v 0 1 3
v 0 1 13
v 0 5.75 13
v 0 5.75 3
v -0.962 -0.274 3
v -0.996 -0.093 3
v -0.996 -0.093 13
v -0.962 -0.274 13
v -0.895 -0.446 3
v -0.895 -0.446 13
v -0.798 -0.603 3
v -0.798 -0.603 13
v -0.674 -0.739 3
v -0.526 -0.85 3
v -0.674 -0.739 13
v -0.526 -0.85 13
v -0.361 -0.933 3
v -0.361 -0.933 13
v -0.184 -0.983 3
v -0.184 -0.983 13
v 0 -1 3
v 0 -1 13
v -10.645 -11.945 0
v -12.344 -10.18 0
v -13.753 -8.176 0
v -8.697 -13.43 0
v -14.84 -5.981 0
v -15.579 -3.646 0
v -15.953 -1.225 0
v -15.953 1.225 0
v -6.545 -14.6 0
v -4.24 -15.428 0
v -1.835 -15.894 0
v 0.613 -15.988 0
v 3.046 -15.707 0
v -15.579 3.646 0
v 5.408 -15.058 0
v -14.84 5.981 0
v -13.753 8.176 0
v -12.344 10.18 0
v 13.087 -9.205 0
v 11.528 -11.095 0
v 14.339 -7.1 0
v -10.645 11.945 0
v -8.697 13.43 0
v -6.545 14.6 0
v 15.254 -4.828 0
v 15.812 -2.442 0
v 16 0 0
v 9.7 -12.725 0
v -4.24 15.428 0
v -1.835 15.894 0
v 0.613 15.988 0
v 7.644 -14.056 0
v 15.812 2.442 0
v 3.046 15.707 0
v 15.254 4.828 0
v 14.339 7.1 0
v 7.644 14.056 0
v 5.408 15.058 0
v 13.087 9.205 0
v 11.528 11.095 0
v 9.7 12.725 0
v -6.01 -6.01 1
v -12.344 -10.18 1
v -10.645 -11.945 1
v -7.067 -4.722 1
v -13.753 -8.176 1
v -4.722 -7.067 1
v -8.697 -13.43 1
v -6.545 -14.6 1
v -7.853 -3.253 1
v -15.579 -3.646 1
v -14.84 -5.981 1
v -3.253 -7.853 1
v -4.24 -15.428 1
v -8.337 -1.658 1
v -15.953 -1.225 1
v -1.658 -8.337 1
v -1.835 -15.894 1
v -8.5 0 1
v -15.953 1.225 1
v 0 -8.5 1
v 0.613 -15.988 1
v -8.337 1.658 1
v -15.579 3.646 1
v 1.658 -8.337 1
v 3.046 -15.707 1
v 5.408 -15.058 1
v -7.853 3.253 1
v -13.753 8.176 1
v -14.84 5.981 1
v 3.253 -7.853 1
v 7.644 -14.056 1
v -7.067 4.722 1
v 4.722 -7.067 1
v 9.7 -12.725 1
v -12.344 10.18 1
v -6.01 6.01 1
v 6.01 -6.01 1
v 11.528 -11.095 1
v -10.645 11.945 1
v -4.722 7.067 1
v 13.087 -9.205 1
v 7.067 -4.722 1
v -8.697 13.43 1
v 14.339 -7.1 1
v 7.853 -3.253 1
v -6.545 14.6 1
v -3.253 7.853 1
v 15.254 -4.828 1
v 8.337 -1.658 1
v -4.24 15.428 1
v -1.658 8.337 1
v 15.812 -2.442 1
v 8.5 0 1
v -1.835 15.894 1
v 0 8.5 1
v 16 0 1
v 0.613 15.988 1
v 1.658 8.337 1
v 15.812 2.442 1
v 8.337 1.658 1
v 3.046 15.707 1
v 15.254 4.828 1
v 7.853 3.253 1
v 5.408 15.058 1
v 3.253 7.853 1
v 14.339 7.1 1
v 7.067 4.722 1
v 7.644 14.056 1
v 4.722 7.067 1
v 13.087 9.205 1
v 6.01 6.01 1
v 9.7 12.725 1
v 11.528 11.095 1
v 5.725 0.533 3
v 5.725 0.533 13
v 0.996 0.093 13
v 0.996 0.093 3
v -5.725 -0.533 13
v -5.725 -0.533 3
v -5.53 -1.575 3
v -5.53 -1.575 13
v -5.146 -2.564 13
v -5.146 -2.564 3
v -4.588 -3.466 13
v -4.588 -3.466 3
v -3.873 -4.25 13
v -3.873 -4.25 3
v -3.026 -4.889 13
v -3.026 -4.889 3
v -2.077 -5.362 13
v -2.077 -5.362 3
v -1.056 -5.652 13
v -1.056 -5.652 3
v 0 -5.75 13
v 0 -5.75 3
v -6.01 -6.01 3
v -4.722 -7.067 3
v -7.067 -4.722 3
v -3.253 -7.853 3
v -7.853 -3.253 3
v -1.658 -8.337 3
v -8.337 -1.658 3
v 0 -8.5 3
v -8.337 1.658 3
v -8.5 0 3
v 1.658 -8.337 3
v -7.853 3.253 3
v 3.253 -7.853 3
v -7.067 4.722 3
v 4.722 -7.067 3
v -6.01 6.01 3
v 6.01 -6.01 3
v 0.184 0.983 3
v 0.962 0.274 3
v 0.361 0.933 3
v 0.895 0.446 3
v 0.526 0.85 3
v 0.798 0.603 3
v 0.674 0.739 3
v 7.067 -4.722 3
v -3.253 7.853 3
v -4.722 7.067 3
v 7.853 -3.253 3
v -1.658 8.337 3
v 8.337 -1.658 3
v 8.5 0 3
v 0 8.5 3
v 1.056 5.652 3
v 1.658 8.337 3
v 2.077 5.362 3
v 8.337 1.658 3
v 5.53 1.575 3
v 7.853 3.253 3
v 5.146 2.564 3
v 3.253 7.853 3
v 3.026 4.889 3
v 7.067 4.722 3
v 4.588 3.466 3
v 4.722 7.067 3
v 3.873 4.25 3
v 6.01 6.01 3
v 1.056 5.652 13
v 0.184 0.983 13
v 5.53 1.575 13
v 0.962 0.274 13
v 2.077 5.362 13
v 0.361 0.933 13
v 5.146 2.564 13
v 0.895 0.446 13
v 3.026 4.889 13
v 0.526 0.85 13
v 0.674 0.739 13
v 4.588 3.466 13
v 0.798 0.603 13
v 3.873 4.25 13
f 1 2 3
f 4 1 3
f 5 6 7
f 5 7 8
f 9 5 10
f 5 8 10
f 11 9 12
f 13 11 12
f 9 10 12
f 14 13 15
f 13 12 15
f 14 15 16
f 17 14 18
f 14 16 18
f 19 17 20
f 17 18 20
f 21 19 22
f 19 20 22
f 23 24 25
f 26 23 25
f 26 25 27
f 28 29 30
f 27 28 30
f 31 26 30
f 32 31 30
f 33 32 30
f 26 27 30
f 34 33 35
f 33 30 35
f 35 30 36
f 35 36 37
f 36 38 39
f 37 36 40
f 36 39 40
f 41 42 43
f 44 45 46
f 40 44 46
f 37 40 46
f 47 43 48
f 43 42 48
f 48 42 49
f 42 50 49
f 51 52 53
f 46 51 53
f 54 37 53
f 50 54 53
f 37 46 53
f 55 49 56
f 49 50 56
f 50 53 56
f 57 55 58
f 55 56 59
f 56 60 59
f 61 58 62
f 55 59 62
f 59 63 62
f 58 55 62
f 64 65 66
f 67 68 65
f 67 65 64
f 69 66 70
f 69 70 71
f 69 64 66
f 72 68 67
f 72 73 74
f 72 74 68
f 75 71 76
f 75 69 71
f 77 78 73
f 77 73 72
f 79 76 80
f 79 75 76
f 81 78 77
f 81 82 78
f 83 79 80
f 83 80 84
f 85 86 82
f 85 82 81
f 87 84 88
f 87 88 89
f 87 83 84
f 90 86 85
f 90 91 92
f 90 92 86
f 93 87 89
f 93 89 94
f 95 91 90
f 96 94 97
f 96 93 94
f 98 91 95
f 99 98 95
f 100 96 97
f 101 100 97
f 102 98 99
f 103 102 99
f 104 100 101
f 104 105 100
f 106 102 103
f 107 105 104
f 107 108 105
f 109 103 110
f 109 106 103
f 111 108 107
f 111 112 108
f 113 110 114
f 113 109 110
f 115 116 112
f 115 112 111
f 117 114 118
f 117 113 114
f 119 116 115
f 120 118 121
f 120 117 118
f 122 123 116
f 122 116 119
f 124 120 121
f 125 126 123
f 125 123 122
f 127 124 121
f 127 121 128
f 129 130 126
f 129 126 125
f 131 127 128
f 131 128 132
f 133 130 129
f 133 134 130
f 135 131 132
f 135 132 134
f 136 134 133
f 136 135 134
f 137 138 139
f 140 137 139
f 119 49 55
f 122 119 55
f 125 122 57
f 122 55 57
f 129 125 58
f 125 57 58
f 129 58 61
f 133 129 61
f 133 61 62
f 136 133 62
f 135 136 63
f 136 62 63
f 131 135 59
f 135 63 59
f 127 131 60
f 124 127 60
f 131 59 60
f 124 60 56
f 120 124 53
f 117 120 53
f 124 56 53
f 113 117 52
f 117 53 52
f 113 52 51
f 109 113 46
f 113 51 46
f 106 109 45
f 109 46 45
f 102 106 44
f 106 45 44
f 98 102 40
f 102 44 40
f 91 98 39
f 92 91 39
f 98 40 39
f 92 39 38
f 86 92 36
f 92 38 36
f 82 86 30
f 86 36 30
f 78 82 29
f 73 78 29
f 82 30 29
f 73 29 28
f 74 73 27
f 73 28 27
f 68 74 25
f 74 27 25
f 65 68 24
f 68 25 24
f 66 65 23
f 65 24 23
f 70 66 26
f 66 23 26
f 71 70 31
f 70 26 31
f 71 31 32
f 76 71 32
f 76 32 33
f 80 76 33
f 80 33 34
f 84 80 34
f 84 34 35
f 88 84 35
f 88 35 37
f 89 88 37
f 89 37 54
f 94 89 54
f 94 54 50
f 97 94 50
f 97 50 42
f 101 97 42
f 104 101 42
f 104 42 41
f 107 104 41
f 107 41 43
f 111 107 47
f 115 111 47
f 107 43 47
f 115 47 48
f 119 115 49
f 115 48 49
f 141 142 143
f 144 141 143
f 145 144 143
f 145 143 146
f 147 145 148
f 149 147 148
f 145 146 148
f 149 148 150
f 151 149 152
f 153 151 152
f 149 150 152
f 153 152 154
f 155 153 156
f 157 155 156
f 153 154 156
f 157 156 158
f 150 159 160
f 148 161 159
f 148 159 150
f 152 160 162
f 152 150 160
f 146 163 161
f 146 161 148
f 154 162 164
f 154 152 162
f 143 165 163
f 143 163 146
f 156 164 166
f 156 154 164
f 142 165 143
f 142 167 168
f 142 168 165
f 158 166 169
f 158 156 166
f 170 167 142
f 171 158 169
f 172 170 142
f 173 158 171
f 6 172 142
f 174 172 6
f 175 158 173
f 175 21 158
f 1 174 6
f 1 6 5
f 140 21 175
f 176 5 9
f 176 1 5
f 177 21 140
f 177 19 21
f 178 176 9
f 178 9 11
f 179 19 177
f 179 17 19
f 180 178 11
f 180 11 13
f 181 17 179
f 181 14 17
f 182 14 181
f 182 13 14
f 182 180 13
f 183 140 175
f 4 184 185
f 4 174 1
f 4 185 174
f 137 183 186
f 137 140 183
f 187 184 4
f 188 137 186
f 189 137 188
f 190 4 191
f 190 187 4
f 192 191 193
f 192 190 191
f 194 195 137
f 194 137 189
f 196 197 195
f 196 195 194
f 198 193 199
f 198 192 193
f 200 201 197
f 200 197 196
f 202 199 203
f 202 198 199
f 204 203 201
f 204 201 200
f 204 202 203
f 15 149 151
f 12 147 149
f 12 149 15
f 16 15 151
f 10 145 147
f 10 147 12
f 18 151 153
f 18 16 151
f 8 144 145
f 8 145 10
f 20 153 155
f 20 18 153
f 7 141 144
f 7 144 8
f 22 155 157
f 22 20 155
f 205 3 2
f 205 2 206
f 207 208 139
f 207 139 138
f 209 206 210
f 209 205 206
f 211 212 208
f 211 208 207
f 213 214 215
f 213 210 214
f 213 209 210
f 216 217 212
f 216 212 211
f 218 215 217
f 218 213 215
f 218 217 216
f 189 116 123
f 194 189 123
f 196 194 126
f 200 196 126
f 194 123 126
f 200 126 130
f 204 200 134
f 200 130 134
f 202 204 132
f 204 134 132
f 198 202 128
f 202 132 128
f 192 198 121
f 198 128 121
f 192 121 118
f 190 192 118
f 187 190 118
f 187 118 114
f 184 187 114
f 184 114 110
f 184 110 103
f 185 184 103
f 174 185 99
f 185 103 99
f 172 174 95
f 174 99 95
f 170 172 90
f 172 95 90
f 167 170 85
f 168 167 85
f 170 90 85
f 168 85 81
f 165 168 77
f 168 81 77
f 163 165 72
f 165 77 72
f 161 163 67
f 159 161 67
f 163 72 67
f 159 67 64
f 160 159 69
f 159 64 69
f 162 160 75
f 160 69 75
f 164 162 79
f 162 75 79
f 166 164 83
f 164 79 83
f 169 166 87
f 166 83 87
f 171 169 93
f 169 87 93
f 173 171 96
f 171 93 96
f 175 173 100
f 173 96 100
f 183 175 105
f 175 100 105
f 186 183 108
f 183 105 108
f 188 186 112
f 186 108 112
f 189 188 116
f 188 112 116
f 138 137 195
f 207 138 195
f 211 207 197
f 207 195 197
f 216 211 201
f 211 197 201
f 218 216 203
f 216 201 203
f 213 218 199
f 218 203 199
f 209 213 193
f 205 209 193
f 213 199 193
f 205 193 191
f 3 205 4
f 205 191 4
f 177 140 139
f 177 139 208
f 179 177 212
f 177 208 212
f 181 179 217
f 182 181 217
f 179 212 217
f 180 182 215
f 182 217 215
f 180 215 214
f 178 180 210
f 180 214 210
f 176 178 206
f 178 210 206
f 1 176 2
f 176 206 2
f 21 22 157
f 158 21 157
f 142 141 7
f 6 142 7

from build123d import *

# Parameters (mm, degrees)
F0_R     = 16
F1_DEPTH = 1
F2_R     = 8.5
F3_DEPTH = 2
F4_R     = 5.75
F5_DEPTH = 10
F7_DEPTH = 10


with BuildPart() as f1:
    # F0 (on Top) → F1 (new body)
    with BuildSketch(Plane.XY):
        Circle(F0_R)
    extrude(amount=F1_DEPTH)

    # F2 (on face) → F3 (join)
    with BuildSketch(Plane.XY.offset(1)):
        Circle(F2_R)
    extrude(amount=F3_DEPTH)

    # F4 (on face) → F5 (join)
    with BuildSketch(Plane.XY.offset(3)):
        Circle(F4_R)
    extrude(amount=F5_DEPTH)

    # F6 (on face) → F7 (cut)
    with BuildSketch(Plane.XY.offset(13)):
        with BuildLine():
            Line((0, 1), (0, 5.75))
            ThreePointArc((0, 5.75), (-4.25, 3.872983), (-5.72528, -0.532609))
            Line((-5.72528, -0.532609), (-0.995701, -0.092628))
            ThreePointArc((-0.995701, -0.092628), (-0.673562, -0.73913), (0, -1))
            Line((0, -1), (0, -5.75))
            ThreePointArc((0, -5.75), (4.25, -3.872983), (5.72528, 0.532609))
            Line((5.72528, 0.532609), (0.995701, 0.092628))
            ThreePointArc((0.995701, 0.092628), (0.673562, 0.73913), (0, 1))
        make_face()
    extrude(amount=-F7_DEPTH, mode=Mode.SUBTRACT)


solid = f1.part
